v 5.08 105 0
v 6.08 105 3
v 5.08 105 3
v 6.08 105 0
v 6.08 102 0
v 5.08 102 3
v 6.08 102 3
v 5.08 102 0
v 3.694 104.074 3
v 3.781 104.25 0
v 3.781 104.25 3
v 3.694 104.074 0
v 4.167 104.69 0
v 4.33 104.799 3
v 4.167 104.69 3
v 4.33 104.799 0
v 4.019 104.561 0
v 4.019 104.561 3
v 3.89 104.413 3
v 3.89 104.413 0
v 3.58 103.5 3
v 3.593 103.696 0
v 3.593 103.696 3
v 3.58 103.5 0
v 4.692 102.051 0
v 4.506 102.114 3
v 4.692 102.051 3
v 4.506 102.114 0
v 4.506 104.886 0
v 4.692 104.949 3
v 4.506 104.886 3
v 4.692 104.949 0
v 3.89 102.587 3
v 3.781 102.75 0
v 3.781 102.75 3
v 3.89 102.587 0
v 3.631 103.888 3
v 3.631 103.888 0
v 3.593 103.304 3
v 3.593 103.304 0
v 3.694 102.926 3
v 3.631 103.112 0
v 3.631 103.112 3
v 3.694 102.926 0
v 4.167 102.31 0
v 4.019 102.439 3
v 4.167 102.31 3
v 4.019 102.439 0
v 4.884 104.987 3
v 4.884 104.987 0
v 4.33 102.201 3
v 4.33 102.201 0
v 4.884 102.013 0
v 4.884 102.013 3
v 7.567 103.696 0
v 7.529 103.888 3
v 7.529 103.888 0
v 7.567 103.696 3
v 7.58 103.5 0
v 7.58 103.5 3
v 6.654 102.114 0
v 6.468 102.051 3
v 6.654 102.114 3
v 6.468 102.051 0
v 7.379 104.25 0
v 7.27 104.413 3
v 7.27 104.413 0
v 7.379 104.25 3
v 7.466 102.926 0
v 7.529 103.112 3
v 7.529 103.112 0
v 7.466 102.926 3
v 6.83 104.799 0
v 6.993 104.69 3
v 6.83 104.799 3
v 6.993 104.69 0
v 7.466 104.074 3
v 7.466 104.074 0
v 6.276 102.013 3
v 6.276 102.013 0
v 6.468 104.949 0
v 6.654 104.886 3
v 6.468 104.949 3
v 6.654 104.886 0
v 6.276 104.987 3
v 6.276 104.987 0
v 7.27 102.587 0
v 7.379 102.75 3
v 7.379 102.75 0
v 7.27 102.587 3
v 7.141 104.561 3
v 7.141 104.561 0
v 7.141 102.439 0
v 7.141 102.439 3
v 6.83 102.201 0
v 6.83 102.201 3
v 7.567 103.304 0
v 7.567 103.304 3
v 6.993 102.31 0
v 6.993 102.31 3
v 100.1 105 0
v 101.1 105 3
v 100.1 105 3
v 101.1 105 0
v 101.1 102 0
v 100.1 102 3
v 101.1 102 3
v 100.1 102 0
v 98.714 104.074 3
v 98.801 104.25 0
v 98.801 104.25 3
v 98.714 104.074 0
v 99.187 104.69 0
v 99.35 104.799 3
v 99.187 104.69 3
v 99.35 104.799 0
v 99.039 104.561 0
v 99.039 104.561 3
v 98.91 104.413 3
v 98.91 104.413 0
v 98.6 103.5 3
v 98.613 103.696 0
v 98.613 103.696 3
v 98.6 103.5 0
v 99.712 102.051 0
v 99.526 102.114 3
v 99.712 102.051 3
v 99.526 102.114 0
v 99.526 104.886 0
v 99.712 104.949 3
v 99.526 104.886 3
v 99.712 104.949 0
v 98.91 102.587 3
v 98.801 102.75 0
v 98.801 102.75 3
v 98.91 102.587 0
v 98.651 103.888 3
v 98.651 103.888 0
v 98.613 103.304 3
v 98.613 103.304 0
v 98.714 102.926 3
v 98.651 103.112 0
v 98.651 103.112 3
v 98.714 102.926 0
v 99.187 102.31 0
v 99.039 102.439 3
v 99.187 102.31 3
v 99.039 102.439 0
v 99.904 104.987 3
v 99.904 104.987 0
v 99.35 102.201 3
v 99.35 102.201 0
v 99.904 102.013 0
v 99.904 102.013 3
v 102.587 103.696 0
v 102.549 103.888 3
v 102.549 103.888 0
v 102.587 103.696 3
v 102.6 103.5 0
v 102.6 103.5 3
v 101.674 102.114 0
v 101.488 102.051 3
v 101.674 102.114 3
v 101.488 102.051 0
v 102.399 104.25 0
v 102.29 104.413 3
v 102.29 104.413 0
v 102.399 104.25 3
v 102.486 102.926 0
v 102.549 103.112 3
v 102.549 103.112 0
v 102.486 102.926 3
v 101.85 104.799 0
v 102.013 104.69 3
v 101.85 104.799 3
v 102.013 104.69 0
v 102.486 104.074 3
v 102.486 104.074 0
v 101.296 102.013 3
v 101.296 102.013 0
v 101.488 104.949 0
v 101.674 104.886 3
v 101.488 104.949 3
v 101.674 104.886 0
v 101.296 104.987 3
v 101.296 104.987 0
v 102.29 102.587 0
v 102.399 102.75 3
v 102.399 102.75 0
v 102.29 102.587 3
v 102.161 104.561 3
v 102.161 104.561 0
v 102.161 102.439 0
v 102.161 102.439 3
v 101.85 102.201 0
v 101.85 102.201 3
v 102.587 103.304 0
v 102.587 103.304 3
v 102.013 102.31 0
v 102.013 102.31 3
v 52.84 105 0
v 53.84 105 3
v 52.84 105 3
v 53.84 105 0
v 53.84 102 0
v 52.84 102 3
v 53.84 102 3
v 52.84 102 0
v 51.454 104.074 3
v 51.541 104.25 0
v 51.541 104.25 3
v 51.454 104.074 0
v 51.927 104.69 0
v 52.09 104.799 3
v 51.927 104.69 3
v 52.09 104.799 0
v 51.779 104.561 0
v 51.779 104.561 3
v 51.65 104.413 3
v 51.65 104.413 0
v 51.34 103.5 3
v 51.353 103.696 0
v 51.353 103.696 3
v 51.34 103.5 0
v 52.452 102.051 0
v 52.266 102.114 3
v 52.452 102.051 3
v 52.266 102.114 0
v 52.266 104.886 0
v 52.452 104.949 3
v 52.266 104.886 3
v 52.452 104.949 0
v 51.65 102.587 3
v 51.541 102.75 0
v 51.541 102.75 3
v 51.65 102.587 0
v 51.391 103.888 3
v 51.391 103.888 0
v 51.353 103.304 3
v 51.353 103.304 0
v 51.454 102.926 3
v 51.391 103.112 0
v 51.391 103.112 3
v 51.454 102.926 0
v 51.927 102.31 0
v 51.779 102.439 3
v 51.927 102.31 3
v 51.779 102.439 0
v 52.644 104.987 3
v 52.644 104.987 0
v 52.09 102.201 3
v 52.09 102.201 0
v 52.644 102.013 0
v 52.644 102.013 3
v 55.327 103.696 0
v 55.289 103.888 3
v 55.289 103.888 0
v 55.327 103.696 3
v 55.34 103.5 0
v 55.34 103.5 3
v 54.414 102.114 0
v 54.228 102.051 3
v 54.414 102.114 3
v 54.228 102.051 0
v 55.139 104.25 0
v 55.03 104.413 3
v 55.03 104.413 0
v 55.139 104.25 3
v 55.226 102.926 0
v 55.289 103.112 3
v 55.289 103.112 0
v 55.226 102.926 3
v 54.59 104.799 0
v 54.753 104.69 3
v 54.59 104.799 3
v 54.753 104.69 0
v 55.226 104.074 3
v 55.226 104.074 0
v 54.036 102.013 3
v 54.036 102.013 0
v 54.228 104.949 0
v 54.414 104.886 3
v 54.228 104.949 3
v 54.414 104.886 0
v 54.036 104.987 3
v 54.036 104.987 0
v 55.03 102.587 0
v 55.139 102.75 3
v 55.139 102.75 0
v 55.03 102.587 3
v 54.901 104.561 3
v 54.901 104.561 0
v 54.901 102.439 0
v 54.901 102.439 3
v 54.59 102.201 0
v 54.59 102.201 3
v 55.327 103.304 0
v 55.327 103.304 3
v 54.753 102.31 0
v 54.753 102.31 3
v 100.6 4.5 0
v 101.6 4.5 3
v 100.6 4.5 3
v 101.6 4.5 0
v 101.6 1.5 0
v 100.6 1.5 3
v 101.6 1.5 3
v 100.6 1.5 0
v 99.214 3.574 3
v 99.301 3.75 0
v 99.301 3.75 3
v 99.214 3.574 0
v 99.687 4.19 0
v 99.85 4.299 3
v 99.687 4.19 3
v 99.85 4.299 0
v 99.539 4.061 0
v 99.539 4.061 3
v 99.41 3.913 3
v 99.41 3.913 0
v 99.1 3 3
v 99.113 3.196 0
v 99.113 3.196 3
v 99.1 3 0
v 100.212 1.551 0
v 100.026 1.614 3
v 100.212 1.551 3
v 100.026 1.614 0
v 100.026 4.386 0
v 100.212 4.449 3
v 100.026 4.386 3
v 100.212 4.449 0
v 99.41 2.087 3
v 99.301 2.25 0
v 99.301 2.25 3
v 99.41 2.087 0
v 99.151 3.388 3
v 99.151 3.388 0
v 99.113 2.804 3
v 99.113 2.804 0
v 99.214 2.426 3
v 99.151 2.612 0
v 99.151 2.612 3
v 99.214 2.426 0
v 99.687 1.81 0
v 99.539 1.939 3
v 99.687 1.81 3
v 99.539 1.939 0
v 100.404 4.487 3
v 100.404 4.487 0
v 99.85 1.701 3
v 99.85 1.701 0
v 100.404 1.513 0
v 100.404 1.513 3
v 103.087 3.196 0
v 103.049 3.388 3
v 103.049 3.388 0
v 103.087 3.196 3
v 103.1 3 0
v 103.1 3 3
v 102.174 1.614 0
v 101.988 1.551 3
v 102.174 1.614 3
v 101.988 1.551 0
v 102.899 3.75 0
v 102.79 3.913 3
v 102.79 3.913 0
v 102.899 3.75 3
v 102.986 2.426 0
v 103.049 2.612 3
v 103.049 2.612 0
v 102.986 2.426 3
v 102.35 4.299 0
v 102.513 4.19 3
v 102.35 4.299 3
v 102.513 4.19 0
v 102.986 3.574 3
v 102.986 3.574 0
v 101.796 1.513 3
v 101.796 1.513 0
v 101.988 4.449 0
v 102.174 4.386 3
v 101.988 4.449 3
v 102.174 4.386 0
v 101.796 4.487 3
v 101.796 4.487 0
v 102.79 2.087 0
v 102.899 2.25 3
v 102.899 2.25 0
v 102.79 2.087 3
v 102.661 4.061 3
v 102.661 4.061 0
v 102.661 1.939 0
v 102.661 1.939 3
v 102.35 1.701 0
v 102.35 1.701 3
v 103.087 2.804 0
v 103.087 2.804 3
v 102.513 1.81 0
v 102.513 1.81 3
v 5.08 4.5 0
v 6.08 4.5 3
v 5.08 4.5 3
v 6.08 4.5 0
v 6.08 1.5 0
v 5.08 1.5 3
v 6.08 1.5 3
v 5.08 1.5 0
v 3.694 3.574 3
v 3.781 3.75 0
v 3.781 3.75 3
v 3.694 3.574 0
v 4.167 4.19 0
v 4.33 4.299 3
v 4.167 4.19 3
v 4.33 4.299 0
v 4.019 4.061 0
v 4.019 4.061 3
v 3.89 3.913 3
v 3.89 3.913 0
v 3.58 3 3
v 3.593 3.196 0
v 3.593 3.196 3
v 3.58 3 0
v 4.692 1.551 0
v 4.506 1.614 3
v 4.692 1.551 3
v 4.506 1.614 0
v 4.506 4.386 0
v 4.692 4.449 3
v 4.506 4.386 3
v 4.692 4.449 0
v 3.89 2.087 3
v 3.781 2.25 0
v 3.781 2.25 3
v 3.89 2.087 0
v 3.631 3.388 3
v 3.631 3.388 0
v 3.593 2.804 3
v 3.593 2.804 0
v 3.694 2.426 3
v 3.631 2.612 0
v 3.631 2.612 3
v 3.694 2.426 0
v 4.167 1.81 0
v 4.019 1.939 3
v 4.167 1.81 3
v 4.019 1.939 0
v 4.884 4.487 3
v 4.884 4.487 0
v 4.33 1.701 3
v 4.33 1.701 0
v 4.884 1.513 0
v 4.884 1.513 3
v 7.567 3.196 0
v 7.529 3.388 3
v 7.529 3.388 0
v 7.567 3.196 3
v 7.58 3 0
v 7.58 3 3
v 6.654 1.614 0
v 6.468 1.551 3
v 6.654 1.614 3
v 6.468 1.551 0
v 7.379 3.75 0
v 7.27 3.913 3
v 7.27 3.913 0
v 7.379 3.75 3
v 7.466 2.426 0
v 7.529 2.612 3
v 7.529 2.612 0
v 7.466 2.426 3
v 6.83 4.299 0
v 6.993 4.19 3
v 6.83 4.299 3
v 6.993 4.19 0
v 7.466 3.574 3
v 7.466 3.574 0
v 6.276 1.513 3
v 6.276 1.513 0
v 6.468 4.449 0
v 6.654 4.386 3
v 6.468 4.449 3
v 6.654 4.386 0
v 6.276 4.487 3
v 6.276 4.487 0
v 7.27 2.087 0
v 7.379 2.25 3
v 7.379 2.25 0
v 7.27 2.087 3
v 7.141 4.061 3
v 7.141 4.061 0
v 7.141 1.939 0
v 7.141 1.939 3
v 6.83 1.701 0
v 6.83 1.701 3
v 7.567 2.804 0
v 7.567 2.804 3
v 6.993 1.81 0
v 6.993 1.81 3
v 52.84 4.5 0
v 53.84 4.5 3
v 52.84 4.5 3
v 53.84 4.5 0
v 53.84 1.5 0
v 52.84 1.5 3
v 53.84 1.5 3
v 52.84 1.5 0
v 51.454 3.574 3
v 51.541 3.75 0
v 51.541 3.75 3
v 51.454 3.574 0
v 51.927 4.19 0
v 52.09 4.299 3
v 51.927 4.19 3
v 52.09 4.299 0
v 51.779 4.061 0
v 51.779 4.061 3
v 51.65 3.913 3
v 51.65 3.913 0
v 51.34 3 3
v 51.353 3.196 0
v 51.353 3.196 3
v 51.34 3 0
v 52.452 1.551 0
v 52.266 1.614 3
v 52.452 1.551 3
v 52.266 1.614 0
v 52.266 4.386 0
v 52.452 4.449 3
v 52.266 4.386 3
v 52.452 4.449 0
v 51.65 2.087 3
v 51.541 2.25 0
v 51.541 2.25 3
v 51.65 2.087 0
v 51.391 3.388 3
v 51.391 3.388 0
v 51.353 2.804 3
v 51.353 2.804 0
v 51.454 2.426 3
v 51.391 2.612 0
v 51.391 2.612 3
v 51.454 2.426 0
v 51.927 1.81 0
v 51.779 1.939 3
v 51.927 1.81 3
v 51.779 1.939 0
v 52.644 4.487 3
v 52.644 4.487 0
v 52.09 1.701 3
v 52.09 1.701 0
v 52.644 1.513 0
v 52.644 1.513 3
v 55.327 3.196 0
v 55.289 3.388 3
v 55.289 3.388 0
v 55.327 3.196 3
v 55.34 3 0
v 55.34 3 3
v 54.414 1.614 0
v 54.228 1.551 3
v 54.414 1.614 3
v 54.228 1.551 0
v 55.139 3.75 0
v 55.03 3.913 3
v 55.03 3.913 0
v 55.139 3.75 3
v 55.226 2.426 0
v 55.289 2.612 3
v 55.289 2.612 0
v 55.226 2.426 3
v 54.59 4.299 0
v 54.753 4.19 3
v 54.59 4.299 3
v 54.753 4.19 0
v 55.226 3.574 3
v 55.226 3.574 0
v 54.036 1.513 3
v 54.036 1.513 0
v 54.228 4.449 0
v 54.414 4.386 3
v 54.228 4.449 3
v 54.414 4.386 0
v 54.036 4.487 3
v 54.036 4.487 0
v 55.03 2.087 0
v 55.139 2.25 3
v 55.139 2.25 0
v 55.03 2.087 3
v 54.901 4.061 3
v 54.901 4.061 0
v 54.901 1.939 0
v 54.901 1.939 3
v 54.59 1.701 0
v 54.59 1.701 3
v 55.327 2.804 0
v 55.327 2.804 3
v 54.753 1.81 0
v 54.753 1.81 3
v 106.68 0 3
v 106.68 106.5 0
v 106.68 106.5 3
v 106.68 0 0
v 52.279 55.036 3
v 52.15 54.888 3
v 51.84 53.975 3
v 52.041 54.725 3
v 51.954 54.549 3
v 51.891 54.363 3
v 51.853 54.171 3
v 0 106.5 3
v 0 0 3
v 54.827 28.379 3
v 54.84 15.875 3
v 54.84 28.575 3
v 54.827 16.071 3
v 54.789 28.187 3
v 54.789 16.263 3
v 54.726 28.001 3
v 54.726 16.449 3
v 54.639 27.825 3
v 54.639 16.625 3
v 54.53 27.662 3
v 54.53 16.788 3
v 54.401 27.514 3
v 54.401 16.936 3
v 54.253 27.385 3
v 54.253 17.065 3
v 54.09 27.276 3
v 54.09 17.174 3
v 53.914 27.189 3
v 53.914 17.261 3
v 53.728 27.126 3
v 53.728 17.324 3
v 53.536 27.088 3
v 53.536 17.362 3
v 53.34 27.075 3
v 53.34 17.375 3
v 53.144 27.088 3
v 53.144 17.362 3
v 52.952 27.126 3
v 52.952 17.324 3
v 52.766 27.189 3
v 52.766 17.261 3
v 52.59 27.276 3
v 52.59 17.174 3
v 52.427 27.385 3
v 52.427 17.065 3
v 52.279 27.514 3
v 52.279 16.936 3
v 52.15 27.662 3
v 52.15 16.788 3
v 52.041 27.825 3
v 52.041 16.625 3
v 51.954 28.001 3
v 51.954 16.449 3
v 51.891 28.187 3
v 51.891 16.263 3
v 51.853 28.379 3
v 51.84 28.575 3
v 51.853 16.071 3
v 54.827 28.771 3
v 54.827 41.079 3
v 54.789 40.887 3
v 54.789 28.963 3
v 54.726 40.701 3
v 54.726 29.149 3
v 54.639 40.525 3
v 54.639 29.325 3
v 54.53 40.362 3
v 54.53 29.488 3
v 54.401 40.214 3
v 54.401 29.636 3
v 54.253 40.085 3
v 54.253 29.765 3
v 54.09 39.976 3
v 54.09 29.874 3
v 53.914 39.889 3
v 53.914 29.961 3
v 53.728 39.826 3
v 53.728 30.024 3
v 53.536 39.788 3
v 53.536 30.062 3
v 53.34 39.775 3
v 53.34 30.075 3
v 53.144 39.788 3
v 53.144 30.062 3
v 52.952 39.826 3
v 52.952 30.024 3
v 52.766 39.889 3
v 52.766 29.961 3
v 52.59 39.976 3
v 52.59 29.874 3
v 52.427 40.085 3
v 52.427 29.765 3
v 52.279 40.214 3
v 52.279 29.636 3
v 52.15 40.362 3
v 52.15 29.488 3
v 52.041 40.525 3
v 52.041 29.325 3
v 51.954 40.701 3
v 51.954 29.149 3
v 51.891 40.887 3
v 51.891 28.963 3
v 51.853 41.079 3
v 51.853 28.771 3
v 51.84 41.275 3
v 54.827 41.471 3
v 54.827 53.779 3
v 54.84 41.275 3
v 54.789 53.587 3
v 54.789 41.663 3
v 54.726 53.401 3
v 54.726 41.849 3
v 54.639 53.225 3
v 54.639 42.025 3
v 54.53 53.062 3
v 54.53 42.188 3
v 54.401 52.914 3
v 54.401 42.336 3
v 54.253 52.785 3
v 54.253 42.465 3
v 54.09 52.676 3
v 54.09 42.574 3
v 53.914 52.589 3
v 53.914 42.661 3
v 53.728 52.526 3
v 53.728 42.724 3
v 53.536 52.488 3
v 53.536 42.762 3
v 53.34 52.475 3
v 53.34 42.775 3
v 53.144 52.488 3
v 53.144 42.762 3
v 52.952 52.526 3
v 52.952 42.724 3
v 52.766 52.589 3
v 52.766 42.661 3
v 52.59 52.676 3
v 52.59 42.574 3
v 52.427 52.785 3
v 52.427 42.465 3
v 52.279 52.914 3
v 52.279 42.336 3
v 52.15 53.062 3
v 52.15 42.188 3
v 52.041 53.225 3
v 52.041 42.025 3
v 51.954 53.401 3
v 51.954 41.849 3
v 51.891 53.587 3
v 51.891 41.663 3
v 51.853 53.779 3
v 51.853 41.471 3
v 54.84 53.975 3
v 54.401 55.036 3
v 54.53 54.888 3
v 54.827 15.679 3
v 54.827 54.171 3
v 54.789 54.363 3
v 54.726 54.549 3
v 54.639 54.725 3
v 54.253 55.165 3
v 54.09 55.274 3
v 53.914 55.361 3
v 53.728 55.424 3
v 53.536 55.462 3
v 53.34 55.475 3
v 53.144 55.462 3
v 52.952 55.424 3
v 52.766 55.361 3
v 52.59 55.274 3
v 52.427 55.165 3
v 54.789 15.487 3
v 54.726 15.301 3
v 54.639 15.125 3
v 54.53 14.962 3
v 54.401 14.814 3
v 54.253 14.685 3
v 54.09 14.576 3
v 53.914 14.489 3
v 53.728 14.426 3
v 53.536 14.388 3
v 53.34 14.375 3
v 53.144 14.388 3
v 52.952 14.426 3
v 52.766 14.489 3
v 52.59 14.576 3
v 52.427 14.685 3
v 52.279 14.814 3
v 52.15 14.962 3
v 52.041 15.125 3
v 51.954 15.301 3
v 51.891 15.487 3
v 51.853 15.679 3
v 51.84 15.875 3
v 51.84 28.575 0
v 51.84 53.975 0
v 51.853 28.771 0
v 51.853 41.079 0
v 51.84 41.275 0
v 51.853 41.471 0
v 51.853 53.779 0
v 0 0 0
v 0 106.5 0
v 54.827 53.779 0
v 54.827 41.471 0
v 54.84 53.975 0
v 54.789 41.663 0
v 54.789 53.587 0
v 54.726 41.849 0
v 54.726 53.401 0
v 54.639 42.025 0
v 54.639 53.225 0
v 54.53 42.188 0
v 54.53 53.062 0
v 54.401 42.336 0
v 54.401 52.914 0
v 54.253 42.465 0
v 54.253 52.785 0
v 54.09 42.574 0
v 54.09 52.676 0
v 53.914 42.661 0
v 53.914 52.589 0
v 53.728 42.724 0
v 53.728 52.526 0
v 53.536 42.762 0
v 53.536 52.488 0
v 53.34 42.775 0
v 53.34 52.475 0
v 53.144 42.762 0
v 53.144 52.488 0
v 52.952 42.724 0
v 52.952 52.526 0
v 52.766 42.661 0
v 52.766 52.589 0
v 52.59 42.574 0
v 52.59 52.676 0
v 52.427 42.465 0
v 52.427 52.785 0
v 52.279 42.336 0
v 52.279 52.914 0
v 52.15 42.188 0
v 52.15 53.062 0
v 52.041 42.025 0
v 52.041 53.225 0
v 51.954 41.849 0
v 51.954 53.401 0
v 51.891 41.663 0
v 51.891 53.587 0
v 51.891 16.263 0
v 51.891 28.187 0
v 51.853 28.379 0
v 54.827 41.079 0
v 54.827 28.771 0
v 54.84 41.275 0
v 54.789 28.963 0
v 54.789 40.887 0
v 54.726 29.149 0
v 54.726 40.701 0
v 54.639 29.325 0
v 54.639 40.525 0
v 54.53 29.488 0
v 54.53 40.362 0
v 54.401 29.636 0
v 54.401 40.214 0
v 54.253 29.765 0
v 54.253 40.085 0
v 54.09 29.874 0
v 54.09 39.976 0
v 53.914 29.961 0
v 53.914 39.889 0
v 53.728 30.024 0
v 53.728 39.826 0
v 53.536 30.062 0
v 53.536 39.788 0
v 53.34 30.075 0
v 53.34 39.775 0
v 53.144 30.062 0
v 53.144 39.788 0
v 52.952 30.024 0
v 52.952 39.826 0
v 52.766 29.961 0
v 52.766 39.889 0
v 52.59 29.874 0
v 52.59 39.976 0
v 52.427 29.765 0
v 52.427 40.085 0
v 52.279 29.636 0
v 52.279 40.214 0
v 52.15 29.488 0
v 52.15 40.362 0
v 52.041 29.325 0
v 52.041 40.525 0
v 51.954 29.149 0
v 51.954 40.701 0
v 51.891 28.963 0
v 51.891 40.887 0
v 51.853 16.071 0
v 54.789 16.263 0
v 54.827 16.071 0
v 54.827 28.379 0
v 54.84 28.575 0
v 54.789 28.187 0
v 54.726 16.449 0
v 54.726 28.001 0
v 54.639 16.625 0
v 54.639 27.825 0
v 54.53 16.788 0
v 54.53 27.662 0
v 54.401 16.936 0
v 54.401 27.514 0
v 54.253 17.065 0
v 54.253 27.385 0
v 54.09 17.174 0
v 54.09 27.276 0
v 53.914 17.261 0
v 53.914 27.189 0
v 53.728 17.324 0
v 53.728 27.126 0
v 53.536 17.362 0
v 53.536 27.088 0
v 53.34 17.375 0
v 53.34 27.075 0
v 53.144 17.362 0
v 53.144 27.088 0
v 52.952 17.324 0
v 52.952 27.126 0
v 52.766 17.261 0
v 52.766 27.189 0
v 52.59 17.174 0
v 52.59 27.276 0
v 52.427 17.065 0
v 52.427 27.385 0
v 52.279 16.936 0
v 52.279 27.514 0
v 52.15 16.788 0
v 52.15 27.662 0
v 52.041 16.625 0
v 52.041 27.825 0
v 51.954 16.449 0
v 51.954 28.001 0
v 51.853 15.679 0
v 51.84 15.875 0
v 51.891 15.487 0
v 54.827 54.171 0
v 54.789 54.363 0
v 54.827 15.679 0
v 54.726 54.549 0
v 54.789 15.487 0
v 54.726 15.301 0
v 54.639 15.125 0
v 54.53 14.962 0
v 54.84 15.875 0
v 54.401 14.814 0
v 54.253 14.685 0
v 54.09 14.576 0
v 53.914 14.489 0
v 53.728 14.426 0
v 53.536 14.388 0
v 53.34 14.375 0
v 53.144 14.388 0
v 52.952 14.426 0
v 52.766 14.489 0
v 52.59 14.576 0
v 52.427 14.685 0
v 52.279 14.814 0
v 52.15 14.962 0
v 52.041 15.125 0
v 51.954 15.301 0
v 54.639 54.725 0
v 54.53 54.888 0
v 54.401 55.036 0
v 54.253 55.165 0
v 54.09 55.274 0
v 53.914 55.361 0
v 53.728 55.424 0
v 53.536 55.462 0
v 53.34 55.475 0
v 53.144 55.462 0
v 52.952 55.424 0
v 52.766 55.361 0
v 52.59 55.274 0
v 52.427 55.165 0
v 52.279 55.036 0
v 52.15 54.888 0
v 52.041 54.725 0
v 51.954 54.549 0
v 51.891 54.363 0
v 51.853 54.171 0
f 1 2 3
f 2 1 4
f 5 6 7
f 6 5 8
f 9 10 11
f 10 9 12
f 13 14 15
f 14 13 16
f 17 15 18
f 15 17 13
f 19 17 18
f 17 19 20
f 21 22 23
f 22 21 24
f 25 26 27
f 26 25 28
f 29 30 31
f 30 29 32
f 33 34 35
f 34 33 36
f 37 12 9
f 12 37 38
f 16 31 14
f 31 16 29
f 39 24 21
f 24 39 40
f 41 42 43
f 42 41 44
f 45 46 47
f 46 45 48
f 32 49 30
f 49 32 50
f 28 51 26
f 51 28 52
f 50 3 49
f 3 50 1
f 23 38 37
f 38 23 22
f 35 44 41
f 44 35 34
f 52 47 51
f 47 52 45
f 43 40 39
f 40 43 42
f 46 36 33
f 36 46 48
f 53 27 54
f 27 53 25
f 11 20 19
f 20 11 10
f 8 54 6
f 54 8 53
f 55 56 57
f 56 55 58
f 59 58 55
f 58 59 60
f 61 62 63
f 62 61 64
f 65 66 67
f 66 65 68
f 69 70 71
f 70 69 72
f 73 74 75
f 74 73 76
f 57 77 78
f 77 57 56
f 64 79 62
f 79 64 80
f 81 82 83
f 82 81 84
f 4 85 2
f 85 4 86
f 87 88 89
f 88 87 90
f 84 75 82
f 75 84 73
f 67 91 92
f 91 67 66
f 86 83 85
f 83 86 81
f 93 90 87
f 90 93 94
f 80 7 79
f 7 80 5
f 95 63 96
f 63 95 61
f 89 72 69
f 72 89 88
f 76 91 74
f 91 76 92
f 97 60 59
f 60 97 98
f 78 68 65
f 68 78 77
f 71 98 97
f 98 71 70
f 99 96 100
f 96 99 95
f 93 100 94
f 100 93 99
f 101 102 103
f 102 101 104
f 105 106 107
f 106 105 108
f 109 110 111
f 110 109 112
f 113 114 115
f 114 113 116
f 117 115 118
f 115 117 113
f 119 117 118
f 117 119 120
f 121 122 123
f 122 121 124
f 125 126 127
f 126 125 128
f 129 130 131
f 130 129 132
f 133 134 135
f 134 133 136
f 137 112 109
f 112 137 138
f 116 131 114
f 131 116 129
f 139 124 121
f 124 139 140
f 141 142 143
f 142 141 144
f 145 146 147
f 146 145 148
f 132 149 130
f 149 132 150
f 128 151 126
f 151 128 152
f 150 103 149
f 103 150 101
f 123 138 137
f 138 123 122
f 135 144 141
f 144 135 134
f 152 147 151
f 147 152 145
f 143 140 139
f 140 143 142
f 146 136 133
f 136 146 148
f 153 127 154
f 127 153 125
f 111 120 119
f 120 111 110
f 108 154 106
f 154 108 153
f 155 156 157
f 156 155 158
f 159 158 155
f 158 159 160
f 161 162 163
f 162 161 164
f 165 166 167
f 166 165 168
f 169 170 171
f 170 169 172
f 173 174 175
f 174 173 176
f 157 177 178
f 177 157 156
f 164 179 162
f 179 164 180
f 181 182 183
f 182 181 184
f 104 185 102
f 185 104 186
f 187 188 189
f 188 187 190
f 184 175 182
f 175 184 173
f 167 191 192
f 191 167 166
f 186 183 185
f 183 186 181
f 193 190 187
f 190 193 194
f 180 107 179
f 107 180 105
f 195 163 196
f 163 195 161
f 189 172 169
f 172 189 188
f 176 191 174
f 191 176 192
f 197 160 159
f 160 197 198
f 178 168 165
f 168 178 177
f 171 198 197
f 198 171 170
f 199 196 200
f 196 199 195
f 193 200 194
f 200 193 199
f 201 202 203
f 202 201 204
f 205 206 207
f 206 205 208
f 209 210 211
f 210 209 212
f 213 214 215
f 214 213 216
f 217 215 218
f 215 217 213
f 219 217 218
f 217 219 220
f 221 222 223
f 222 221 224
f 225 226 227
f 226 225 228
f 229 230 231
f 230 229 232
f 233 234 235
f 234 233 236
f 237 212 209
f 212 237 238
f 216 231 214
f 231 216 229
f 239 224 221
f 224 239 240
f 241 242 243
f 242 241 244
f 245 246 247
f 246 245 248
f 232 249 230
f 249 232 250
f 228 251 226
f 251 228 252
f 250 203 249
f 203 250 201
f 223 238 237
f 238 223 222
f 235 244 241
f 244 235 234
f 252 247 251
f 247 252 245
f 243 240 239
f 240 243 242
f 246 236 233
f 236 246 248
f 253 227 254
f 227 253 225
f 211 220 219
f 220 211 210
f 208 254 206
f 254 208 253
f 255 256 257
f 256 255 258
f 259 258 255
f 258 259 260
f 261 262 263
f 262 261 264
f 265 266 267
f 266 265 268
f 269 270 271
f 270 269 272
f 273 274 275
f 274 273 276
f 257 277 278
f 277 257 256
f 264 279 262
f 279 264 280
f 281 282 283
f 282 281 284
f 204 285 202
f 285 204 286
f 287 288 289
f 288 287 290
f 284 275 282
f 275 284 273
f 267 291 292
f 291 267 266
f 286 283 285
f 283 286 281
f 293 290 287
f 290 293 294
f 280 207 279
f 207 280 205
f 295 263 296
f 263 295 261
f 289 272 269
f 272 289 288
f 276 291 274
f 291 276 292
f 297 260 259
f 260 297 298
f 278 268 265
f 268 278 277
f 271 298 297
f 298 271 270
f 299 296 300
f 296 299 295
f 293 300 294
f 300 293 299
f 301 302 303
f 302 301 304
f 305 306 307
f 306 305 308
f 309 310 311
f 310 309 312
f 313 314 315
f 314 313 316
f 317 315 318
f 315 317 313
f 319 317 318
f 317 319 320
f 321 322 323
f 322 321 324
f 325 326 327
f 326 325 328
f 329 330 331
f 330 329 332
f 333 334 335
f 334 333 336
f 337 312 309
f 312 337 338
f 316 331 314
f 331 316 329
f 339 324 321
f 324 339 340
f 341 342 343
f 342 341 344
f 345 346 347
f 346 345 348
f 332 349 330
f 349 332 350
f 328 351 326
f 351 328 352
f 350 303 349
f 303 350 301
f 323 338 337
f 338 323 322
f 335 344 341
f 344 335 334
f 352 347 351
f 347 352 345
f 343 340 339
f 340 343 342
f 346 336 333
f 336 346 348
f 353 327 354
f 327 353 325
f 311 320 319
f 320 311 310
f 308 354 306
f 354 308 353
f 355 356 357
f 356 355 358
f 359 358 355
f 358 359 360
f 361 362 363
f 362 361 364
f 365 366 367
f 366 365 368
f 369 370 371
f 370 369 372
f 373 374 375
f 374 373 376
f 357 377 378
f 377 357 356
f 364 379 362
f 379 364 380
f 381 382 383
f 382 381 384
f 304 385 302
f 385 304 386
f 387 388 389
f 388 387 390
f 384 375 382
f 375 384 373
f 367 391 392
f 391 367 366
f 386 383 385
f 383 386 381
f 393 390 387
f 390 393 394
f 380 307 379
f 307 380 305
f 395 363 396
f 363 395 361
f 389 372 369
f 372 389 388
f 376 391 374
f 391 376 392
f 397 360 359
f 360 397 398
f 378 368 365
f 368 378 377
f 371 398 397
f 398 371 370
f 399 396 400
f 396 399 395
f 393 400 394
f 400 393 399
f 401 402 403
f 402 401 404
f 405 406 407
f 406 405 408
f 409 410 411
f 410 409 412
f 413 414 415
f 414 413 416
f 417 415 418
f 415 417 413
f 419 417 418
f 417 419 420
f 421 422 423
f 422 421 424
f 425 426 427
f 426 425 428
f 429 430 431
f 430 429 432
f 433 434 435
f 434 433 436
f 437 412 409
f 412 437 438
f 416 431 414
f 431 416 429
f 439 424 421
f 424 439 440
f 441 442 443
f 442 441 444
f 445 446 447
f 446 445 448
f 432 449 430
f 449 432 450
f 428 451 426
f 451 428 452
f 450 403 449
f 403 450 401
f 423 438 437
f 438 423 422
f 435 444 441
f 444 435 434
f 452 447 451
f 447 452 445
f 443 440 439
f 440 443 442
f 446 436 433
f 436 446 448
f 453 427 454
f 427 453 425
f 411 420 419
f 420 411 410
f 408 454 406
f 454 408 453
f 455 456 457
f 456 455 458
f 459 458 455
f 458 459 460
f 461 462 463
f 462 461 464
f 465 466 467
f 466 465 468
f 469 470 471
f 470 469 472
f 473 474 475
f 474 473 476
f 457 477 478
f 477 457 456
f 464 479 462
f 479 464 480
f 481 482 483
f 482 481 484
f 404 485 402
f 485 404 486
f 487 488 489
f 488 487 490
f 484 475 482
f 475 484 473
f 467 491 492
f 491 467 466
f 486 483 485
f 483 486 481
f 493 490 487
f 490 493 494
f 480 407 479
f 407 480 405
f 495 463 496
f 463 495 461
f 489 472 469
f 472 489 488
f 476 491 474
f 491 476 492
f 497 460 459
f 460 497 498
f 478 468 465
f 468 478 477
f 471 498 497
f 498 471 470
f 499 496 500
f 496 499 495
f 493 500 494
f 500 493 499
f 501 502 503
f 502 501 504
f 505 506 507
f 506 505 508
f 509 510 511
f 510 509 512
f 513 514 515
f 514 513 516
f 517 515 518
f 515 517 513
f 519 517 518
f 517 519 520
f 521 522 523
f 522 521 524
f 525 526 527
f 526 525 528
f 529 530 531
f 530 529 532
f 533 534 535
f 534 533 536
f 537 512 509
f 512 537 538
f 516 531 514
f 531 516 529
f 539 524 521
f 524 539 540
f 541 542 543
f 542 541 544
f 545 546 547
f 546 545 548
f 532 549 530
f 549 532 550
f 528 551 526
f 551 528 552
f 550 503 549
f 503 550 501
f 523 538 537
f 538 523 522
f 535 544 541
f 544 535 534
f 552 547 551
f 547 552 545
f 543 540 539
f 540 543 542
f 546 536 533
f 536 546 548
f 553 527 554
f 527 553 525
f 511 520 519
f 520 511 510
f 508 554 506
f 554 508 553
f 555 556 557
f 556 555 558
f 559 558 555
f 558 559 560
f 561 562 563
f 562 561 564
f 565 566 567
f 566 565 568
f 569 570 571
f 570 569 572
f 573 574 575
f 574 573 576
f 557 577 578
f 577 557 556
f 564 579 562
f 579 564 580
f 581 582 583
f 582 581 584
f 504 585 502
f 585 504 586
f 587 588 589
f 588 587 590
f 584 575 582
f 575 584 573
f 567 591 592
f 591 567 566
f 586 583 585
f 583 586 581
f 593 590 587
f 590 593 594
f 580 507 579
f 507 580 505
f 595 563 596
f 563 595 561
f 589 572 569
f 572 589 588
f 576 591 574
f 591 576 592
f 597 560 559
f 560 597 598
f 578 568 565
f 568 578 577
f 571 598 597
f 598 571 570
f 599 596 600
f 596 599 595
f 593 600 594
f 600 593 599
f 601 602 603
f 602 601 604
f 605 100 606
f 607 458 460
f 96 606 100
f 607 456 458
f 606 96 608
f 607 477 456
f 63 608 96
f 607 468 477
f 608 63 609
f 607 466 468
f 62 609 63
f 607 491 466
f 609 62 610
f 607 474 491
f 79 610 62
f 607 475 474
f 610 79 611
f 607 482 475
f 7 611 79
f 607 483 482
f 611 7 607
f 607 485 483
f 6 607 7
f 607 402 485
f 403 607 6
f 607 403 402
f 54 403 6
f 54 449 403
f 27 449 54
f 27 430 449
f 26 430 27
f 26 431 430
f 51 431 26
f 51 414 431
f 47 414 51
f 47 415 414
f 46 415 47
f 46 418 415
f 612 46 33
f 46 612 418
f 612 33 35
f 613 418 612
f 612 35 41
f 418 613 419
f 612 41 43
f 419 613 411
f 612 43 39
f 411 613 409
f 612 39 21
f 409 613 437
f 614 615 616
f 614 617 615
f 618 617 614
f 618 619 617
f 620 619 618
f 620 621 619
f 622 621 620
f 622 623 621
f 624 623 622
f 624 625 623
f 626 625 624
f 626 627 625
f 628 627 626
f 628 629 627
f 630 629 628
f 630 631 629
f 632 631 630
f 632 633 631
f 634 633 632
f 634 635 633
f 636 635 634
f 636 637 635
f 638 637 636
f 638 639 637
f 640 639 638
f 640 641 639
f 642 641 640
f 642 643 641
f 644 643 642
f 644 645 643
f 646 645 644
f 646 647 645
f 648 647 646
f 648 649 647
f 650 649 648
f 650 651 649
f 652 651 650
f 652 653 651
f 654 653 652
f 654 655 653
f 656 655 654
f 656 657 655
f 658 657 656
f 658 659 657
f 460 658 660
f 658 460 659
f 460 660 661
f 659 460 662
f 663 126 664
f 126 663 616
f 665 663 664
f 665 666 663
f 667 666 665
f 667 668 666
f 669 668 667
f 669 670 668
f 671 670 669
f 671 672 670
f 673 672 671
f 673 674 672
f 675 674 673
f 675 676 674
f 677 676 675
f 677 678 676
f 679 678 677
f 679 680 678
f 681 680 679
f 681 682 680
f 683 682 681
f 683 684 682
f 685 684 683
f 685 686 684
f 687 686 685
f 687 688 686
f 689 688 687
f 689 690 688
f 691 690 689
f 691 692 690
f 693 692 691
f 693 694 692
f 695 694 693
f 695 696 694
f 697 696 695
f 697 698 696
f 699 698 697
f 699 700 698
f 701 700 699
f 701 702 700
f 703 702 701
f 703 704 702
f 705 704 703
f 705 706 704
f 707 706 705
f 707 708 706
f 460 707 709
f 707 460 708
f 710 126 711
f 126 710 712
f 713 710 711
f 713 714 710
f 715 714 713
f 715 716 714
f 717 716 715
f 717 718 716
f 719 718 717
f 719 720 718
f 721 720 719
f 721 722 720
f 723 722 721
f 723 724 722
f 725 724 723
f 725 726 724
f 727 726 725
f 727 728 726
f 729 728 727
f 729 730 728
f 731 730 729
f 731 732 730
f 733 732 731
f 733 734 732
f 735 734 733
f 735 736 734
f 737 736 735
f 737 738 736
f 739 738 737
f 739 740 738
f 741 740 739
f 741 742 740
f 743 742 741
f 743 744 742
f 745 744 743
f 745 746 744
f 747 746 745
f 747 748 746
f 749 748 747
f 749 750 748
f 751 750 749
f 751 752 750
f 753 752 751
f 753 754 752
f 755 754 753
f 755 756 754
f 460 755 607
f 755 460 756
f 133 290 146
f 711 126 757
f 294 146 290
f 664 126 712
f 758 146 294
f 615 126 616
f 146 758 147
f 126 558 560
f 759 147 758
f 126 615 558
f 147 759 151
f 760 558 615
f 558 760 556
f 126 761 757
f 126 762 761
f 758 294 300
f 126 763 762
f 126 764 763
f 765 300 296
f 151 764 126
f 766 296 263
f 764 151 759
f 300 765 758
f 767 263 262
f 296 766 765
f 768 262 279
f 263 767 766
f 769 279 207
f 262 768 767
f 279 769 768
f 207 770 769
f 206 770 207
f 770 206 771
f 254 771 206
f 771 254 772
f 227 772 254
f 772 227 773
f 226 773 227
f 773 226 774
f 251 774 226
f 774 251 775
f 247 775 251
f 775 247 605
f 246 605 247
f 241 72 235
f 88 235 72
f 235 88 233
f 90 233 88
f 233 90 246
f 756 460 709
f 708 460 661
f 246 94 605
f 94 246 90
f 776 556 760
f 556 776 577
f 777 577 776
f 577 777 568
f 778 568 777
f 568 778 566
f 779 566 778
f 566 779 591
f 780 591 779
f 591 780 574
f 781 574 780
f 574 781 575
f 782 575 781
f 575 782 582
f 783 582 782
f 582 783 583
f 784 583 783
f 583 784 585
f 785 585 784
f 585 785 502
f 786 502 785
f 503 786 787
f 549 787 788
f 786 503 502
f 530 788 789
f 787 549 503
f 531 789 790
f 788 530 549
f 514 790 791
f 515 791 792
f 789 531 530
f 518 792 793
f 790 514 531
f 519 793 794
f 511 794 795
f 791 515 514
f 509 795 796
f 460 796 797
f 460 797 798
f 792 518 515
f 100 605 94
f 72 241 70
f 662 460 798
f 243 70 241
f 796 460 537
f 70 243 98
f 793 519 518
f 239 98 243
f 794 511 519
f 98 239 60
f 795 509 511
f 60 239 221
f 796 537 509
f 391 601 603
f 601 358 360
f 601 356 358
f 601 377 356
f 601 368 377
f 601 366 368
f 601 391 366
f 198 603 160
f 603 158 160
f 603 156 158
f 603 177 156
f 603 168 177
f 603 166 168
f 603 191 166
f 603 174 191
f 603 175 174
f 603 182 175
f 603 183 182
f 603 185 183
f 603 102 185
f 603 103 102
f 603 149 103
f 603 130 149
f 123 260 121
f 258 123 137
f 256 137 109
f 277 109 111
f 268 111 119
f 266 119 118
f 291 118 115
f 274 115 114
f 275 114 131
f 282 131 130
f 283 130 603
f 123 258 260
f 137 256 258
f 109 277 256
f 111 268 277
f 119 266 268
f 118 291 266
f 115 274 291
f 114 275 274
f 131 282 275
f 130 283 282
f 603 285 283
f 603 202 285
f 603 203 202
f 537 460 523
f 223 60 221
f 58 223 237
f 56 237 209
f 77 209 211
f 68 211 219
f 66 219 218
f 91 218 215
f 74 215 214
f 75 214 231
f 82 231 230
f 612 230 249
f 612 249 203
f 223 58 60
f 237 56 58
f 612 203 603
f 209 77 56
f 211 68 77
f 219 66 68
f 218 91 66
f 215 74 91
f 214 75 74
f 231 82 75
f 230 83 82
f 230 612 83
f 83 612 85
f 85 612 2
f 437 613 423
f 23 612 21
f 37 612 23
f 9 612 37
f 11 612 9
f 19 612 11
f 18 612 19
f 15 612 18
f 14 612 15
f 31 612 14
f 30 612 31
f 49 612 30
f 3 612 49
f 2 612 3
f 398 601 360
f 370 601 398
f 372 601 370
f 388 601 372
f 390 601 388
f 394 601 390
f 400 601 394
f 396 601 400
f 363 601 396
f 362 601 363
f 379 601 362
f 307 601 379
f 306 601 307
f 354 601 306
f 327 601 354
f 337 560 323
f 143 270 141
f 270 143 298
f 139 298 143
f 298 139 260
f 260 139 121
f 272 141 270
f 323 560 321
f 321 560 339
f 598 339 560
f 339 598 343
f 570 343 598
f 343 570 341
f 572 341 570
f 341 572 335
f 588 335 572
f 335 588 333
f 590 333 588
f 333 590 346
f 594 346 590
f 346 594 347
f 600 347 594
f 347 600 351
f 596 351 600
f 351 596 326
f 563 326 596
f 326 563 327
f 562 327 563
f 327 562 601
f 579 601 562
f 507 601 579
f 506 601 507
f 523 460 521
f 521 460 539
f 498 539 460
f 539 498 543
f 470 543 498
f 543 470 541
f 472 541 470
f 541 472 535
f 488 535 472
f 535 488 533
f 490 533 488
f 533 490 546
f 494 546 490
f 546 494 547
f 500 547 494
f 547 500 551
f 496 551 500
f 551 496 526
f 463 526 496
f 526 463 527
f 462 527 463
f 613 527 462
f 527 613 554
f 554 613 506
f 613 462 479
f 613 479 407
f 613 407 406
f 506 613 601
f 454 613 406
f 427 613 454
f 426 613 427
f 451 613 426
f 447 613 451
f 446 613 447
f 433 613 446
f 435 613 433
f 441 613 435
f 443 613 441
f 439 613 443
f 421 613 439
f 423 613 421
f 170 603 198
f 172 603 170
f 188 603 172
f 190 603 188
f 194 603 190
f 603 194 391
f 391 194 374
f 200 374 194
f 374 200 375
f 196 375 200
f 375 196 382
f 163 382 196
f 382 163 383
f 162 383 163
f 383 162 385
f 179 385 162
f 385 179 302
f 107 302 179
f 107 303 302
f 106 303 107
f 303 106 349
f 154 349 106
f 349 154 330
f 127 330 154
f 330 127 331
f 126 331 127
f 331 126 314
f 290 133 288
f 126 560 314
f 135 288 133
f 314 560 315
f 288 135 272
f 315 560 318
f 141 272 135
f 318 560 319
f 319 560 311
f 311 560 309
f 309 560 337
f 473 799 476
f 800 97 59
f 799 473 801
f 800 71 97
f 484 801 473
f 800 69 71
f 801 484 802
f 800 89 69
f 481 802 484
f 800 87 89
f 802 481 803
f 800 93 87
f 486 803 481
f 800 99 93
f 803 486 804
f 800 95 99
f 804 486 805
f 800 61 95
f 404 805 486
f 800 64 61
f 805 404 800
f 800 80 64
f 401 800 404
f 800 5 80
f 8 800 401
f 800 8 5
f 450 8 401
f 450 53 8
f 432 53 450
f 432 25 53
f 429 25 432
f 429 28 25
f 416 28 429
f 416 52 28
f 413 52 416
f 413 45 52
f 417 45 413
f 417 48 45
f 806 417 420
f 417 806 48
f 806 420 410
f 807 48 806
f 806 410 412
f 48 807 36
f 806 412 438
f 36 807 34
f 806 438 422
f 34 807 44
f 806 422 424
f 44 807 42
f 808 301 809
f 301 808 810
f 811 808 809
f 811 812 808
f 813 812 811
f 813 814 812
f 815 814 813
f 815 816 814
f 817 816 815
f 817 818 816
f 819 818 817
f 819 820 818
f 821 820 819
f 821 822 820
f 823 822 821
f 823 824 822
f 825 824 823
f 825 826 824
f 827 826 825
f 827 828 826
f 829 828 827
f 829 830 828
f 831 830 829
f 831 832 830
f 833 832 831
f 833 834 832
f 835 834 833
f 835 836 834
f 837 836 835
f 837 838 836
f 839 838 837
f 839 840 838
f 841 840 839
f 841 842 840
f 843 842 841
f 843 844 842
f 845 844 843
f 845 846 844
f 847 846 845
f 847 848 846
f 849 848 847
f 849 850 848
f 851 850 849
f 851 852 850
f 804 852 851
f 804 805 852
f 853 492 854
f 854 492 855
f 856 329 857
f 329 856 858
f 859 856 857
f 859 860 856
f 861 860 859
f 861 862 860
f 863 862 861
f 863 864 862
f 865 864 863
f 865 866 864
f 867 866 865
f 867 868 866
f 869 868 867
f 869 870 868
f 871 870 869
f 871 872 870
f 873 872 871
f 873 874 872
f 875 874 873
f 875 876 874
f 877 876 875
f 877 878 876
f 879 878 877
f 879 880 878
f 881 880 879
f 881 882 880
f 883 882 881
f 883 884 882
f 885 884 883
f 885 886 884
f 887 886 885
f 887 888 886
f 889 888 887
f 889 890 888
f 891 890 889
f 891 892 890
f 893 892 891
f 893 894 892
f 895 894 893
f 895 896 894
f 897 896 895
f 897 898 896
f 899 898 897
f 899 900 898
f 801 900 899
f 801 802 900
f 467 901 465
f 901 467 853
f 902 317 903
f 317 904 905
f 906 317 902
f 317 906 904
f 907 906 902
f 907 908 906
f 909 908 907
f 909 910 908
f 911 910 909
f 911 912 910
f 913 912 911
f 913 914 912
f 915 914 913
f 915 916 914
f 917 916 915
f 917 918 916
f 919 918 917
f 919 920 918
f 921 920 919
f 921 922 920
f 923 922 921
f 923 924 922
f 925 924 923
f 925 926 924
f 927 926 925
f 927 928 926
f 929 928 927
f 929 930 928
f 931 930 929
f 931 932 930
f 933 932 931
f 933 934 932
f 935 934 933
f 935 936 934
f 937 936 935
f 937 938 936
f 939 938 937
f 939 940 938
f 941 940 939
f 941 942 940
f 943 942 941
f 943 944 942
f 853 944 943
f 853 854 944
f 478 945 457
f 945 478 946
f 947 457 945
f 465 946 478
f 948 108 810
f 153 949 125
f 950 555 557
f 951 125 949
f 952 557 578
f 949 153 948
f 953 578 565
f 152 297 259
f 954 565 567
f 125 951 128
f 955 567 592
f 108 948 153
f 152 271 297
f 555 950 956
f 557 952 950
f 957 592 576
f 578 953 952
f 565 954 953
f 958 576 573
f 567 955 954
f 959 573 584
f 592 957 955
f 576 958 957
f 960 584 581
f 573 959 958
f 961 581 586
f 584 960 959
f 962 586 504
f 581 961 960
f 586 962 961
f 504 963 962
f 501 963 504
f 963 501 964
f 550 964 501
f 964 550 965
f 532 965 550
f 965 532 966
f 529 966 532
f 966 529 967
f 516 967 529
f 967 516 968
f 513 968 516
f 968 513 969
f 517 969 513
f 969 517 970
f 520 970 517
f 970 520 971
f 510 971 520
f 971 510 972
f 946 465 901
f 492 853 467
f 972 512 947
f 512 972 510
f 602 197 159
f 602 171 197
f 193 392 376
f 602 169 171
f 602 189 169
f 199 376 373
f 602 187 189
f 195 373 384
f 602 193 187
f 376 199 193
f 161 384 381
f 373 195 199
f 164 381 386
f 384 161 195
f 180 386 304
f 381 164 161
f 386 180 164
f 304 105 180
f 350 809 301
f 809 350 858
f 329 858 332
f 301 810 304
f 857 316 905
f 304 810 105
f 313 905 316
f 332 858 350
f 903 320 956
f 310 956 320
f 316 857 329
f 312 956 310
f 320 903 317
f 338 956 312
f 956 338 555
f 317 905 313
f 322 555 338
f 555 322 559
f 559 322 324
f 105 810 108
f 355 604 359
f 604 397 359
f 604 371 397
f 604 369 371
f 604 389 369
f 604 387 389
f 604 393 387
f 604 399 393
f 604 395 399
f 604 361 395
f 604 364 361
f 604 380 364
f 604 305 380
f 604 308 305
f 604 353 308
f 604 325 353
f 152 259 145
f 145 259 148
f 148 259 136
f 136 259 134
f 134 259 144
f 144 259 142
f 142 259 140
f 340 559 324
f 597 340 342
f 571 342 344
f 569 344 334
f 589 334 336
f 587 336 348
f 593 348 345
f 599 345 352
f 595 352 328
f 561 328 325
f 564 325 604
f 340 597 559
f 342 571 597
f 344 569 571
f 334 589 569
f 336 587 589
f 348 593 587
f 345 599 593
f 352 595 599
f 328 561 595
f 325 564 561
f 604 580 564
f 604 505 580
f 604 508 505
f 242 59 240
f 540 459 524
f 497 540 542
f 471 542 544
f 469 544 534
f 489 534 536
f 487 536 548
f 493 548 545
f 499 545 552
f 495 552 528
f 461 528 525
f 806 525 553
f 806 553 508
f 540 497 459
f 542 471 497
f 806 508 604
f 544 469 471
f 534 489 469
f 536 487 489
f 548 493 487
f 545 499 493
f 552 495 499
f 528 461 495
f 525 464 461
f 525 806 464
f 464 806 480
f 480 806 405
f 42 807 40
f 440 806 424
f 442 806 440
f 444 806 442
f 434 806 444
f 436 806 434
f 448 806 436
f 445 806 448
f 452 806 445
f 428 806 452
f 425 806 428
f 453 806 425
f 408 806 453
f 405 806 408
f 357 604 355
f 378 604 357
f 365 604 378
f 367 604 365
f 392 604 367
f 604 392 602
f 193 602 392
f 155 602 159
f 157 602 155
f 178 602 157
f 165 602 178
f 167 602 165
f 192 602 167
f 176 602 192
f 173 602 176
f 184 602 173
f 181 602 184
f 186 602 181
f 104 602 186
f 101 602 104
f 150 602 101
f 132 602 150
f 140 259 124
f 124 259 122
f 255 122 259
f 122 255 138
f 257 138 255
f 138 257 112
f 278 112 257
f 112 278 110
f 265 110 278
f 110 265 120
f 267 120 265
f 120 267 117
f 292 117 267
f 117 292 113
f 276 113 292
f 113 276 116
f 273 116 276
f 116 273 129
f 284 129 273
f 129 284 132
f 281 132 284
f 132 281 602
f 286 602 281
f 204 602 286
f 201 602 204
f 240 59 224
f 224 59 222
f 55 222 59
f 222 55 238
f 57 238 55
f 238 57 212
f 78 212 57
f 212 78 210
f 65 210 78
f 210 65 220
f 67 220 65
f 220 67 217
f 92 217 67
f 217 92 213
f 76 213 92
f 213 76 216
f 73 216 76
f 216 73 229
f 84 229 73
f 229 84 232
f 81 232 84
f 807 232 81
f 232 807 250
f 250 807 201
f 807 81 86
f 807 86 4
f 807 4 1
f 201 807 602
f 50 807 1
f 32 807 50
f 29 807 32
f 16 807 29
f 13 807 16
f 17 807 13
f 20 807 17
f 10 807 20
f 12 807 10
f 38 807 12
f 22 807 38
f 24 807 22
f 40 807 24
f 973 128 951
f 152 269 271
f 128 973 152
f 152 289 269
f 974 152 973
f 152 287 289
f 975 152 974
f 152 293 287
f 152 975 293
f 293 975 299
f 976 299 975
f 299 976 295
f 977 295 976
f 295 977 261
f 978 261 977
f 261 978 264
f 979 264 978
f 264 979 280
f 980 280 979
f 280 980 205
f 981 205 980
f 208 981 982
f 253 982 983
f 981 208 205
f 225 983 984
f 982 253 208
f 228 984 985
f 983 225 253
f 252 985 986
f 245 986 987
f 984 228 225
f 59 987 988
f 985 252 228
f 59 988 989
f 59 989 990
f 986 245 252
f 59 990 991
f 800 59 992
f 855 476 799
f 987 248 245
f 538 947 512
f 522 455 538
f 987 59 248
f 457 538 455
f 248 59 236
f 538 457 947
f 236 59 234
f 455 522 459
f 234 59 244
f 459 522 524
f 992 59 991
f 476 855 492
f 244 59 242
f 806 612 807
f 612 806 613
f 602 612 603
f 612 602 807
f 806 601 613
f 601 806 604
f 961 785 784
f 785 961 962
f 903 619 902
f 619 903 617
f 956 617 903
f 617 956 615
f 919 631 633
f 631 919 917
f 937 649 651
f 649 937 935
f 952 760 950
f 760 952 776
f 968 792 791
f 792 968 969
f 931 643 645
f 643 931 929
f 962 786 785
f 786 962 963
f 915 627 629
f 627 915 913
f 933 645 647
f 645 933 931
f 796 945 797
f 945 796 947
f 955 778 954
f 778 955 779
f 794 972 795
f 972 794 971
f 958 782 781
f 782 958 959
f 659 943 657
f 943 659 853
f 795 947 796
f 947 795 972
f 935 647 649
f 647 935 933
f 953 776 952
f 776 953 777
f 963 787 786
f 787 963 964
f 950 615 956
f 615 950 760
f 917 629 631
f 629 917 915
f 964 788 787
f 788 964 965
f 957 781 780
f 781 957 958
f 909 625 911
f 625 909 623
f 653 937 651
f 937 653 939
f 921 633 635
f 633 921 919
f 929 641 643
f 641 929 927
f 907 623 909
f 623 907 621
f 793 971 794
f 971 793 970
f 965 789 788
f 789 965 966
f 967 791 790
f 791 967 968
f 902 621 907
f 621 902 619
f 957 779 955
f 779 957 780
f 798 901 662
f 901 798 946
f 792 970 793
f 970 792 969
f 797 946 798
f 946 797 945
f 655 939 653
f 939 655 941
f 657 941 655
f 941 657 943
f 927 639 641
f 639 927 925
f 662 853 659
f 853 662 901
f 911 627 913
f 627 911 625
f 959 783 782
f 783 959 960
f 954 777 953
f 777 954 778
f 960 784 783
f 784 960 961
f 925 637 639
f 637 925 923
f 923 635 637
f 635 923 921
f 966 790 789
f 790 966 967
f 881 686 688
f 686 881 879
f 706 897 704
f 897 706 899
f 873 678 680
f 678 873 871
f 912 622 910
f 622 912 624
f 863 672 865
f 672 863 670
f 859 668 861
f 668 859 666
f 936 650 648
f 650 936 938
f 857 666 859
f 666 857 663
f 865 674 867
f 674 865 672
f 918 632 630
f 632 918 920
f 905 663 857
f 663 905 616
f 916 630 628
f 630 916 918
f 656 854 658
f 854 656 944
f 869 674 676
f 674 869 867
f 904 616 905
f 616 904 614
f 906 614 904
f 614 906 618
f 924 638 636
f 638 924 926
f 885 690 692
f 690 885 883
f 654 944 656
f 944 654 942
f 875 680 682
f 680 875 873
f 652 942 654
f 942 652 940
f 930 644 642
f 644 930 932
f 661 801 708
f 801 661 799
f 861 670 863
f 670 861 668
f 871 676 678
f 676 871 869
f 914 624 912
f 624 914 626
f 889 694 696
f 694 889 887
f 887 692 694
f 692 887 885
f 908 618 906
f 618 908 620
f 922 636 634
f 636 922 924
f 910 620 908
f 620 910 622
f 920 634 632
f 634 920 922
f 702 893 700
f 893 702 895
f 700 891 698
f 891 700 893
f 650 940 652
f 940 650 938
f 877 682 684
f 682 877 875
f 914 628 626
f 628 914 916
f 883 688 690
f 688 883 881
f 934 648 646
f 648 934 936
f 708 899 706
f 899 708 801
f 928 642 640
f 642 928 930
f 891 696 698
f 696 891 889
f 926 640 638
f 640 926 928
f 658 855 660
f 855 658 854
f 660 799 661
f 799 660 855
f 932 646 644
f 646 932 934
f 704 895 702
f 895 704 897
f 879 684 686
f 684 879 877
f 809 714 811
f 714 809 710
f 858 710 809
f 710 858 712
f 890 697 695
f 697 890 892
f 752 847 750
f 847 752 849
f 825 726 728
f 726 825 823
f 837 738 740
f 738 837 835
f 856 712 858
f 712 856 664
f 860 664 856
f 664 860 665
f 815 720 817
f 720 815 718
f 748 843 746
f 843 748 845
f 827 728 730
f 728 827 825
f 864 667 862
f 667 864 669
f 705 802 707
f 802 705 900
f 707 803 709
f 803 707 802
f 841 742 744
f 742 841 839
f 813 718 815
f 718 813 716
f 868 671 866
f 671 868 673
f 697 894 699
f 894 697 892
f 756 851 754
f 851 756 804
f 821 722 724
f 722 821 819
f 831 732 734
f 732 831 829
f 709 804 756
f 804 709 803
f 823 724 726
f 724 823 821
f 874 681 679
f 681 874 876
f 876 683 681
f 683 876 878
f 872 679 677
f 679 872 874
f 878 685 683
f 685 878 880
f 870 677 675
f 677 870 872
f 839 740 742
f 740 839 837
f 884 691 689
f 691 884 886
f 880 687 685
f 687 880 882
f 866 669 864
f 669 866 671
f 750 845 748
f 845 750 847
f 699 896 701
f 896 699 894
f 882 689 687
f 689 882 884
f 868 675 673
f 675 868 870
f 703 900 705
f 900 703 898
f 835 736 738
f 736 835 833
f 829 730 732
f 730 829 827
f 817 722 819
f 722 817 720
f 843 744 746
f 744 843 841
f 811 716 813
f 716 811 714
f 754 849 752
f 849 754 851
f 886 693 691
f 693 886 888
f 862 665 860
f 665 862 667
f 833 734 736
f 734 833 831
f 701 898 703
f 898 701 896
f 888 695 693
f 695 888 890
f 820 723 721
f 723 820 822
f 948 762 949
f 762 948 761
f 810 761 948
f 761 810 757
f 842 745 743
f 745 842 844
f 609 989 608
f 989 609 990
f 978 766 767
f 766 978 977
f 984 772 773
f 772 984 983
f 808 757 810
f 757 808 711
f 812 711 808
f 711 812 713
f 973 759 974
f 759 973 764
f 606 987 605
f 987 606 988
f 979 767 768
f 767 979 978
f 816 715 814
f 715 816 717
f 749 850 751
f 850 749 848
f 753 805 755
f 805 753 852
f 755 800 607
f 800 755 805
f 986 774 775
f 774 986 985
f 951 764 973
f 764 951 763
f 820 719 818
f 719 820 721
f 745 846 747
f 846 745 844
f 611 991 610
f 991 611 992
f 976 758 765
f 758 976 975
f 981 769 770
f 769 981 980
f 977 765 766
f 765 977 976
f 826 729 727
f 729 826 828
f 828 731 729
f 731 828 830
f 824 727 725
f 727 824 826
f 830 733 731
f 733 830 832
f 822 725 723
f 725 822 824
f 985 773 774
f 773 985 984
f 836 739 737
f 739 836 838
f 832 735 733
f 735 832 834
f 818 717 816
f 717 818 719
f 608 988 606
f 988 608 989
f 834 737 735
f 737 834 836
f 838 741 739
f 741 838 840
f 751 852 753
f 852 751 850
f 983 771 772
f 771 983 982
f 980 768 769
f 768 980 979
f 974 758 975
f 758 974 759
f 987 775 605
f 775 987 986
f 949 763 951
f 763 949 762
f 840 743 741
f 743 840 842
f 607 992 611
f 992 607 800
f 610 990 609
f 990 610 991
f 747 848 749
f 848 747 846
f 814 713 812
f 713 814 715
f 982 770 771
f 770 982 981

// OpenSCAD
panelThickness = 3;
panelHp=21; //106.5mm
holeCount=6;
mountHoleDiameter = 3;
holeWidth = mountHoleDiameter+1; //If you want wider holes for easier mounting. Otherwise set to any number lower than mountHoleDiameter. Can be passed in as parameter to eurorackPanel()
hwCubeWidth = holeWidth>mountHoleDiameter ? holeWidth-mountHoleDiameter : 0;

// parameters for smooth circles
$fa = 6;
$fs = 0.2; // minimum segment length half the filament laid down (I usually run 0.4)

threeUHeight = 200;//133.35; // overall 3u height - 1U=44.45
//In Eurorack modular synthesizers, horizontal pitch (HP) is the standard unit for measuring module width, where 1 HP equals 0.2 inches (5.08 mm).//
hp=5.08; // horizontal pitch in mm
panelOuterHeight = 106.5; // from Eurorack documentation
offsetToMountHoleCenterY = 3; // from Eurorack documentation
offsetToMountHoleCenterX = panelHp<3 ? hp/2+hwCubeWidth/2 : hp+hwCubeWidth/2;
echo("offsetToMountHoleCenterY",offsetToMountHoleCenterY);
echo("offsetToMountHoleCenterX",offsetToMountHoleCenterX);

module eurorackPanel(panelHp,  mountHoles=2, hw = holeWidth, ignoreMountHoles=false)
{
    //mountHoles ought to be even. Odd values are -=1
    difference()
    {
        cube([hp*panelHp,panelOuterHeight,panelThickness]);
        
        if(!ignoreMountHoles)
        {
            eurorackMountHoles(panelHp, mountHoles, hw);
        }
    }
}

module eurorackMountHoles(php, holes, hw)
{
    holes = holes-holes%2;//mountHoles ought to be even for the sake of code complexity. Odd values are -=1
    eurorackMountHolesTopRow(php, hw, holes/2);
    eurorackMountHolesBottomRow(php, hw, holes/2);
}

module eurorackMountHolesTopRow(php, hw, holes)
{
    
    //topleft
    translate([offsetToMountHoleCenterX,panelOuterHeight-offsetToMountHoleCenterY,0])
    {
        eurorackMountHole(hw); 
    }
    if(holes>1)
    {
        translate([(hp*php)-hwCubeWidth-hp,panelOuterHeight-offsetToMountHoleCenterY,0])
    {
        eurorackMountHole(hw);
    }
    }
    if(holes>2)
    {
        holeDivs = php*hp/(holes-1);
        for (i =[1:holes-2])
        {
            translate([holeDivs*i,panelOuterHeight-offsetToMountHoleCenterY,0]){
                eurorackMountHole(hw);
            }
        }
    }
}

module eurorackMountHolesBottomRow(php, hw, holes)
{
    
    //bottomRight
    translate([(hp*php)-offsetToMountHoleCenterX,offsetToMountHoleCenterY,0])
    {
        eurorackMountHole(hw);
    }
    if(holes>1)
    {
        translate([offsetToMountHoleCenterX,offsetToMountHoleCenterY,0])
        {
        eurorackMountHole(hw);
        }
    }
    if(holes>2)
    {
        holeDivs = php*hp/(holes-1);
        for (i =[1:holes-2])
        {
            translate([holeDivs*i,offsetToMountHoleCenterY,0]){
                eurorackMountHole(hw);
            }
        }
    }
}

module eurorackMountHole(hw)
{
    mountHoleRad = mountHoleDiameter/2;
    mountHoleDepth = panelThickness+2; //because diffs need to be larger than the object they are being diffed from for ideal BSP operations
    
    hwCubeWidth = hwCubeWidth<0 ? 0 : hwCubeWidth;
    translate([0,0,panelThickness/2]){
        union()
        {
            cube([hwCubeWidth, mountHoleDiameter, mountHoleDepth], center=true);
            translate([-hwCubeWidth/2,0,0]){
                cylinder(r=mountHoleRad, h=mountHoleDepth, center=true);
            }
            translate([hwCubeWidth/2,0,0]){
                cylinder(r=mountHoleRad, h=mountHoleDepth, center=true);
            }
        }
    }
}

module aHole(hw)
{
    mountHoleRad = hw/2;
    mountHoleDepth = panelThickness+2; //because diffs need to be larger than the object they are being diffed from for ideal BSP operations

    translate([0,0,-1]){
        cylinder(r=mountHoleRad, h=mountHoleDepth);
    }
}
// interior holes
difference() {  
    eurorackPanel(panelHp, holeCount, holeWidth);
    
    // 0.1 inch (2.54mm) spacing
    
    holeOffset = 0.625*25.4;
    centerX = panelHp*hp/2;
    holeDiameter=3;
    translate([centerX,holeOffset,0]) aHole(holeDiameter);
    translate([centerX,holeOffset+1*0.5*25.4,0]) aHole(holeDiameter);
    translate([centerX,holeOffset+2*0.5*25.4,0]) aHole(holeDiameter);
    translate([centerX,holeOffset+3*0.5*25.4,0]) aHole(holeDiameter);
    
} 
// Eight 6mm Jack holes for making a passive mult
//difference() {  
//    eurorackPanel(panelHp, holeCount, holeWidth);
    
    // 6mm LED holes with 0.1 inch (2.54mm) spacing
//    holeOffset = 0.625*25.4;
//    centerX = panelHp*hp/2;
//    translate([centerX,holeOffset,0]) aHole(6);
//    translate([centerX,holeOffset+1*0.5*25.4,0]) aHole(6);
//    translate([centerX,holeOffset+2*0.5*25.4,0]) aHole(6);
//    translate([centerX,holeOffset+3*0.5*25.4,0]) aHole(6);
    
    // Skip a bit to provide distance (two groups of four) 
//    holeOffset2 = 2.875*25.4;
//    translate([centerX,holeOffset2+0*0.5*25.4,0]) aHole(6);    
//    translate([centerX,holeOffset2+1*0.5*25.4,0]) aHole(6);    
//    translate([centerX,holeOffset2+2*0.5*25.4,0]) aHole(6);
//    translate([centerX,holeOffset2+3*0.5*25.4,0]) aHole(6);
//}   
